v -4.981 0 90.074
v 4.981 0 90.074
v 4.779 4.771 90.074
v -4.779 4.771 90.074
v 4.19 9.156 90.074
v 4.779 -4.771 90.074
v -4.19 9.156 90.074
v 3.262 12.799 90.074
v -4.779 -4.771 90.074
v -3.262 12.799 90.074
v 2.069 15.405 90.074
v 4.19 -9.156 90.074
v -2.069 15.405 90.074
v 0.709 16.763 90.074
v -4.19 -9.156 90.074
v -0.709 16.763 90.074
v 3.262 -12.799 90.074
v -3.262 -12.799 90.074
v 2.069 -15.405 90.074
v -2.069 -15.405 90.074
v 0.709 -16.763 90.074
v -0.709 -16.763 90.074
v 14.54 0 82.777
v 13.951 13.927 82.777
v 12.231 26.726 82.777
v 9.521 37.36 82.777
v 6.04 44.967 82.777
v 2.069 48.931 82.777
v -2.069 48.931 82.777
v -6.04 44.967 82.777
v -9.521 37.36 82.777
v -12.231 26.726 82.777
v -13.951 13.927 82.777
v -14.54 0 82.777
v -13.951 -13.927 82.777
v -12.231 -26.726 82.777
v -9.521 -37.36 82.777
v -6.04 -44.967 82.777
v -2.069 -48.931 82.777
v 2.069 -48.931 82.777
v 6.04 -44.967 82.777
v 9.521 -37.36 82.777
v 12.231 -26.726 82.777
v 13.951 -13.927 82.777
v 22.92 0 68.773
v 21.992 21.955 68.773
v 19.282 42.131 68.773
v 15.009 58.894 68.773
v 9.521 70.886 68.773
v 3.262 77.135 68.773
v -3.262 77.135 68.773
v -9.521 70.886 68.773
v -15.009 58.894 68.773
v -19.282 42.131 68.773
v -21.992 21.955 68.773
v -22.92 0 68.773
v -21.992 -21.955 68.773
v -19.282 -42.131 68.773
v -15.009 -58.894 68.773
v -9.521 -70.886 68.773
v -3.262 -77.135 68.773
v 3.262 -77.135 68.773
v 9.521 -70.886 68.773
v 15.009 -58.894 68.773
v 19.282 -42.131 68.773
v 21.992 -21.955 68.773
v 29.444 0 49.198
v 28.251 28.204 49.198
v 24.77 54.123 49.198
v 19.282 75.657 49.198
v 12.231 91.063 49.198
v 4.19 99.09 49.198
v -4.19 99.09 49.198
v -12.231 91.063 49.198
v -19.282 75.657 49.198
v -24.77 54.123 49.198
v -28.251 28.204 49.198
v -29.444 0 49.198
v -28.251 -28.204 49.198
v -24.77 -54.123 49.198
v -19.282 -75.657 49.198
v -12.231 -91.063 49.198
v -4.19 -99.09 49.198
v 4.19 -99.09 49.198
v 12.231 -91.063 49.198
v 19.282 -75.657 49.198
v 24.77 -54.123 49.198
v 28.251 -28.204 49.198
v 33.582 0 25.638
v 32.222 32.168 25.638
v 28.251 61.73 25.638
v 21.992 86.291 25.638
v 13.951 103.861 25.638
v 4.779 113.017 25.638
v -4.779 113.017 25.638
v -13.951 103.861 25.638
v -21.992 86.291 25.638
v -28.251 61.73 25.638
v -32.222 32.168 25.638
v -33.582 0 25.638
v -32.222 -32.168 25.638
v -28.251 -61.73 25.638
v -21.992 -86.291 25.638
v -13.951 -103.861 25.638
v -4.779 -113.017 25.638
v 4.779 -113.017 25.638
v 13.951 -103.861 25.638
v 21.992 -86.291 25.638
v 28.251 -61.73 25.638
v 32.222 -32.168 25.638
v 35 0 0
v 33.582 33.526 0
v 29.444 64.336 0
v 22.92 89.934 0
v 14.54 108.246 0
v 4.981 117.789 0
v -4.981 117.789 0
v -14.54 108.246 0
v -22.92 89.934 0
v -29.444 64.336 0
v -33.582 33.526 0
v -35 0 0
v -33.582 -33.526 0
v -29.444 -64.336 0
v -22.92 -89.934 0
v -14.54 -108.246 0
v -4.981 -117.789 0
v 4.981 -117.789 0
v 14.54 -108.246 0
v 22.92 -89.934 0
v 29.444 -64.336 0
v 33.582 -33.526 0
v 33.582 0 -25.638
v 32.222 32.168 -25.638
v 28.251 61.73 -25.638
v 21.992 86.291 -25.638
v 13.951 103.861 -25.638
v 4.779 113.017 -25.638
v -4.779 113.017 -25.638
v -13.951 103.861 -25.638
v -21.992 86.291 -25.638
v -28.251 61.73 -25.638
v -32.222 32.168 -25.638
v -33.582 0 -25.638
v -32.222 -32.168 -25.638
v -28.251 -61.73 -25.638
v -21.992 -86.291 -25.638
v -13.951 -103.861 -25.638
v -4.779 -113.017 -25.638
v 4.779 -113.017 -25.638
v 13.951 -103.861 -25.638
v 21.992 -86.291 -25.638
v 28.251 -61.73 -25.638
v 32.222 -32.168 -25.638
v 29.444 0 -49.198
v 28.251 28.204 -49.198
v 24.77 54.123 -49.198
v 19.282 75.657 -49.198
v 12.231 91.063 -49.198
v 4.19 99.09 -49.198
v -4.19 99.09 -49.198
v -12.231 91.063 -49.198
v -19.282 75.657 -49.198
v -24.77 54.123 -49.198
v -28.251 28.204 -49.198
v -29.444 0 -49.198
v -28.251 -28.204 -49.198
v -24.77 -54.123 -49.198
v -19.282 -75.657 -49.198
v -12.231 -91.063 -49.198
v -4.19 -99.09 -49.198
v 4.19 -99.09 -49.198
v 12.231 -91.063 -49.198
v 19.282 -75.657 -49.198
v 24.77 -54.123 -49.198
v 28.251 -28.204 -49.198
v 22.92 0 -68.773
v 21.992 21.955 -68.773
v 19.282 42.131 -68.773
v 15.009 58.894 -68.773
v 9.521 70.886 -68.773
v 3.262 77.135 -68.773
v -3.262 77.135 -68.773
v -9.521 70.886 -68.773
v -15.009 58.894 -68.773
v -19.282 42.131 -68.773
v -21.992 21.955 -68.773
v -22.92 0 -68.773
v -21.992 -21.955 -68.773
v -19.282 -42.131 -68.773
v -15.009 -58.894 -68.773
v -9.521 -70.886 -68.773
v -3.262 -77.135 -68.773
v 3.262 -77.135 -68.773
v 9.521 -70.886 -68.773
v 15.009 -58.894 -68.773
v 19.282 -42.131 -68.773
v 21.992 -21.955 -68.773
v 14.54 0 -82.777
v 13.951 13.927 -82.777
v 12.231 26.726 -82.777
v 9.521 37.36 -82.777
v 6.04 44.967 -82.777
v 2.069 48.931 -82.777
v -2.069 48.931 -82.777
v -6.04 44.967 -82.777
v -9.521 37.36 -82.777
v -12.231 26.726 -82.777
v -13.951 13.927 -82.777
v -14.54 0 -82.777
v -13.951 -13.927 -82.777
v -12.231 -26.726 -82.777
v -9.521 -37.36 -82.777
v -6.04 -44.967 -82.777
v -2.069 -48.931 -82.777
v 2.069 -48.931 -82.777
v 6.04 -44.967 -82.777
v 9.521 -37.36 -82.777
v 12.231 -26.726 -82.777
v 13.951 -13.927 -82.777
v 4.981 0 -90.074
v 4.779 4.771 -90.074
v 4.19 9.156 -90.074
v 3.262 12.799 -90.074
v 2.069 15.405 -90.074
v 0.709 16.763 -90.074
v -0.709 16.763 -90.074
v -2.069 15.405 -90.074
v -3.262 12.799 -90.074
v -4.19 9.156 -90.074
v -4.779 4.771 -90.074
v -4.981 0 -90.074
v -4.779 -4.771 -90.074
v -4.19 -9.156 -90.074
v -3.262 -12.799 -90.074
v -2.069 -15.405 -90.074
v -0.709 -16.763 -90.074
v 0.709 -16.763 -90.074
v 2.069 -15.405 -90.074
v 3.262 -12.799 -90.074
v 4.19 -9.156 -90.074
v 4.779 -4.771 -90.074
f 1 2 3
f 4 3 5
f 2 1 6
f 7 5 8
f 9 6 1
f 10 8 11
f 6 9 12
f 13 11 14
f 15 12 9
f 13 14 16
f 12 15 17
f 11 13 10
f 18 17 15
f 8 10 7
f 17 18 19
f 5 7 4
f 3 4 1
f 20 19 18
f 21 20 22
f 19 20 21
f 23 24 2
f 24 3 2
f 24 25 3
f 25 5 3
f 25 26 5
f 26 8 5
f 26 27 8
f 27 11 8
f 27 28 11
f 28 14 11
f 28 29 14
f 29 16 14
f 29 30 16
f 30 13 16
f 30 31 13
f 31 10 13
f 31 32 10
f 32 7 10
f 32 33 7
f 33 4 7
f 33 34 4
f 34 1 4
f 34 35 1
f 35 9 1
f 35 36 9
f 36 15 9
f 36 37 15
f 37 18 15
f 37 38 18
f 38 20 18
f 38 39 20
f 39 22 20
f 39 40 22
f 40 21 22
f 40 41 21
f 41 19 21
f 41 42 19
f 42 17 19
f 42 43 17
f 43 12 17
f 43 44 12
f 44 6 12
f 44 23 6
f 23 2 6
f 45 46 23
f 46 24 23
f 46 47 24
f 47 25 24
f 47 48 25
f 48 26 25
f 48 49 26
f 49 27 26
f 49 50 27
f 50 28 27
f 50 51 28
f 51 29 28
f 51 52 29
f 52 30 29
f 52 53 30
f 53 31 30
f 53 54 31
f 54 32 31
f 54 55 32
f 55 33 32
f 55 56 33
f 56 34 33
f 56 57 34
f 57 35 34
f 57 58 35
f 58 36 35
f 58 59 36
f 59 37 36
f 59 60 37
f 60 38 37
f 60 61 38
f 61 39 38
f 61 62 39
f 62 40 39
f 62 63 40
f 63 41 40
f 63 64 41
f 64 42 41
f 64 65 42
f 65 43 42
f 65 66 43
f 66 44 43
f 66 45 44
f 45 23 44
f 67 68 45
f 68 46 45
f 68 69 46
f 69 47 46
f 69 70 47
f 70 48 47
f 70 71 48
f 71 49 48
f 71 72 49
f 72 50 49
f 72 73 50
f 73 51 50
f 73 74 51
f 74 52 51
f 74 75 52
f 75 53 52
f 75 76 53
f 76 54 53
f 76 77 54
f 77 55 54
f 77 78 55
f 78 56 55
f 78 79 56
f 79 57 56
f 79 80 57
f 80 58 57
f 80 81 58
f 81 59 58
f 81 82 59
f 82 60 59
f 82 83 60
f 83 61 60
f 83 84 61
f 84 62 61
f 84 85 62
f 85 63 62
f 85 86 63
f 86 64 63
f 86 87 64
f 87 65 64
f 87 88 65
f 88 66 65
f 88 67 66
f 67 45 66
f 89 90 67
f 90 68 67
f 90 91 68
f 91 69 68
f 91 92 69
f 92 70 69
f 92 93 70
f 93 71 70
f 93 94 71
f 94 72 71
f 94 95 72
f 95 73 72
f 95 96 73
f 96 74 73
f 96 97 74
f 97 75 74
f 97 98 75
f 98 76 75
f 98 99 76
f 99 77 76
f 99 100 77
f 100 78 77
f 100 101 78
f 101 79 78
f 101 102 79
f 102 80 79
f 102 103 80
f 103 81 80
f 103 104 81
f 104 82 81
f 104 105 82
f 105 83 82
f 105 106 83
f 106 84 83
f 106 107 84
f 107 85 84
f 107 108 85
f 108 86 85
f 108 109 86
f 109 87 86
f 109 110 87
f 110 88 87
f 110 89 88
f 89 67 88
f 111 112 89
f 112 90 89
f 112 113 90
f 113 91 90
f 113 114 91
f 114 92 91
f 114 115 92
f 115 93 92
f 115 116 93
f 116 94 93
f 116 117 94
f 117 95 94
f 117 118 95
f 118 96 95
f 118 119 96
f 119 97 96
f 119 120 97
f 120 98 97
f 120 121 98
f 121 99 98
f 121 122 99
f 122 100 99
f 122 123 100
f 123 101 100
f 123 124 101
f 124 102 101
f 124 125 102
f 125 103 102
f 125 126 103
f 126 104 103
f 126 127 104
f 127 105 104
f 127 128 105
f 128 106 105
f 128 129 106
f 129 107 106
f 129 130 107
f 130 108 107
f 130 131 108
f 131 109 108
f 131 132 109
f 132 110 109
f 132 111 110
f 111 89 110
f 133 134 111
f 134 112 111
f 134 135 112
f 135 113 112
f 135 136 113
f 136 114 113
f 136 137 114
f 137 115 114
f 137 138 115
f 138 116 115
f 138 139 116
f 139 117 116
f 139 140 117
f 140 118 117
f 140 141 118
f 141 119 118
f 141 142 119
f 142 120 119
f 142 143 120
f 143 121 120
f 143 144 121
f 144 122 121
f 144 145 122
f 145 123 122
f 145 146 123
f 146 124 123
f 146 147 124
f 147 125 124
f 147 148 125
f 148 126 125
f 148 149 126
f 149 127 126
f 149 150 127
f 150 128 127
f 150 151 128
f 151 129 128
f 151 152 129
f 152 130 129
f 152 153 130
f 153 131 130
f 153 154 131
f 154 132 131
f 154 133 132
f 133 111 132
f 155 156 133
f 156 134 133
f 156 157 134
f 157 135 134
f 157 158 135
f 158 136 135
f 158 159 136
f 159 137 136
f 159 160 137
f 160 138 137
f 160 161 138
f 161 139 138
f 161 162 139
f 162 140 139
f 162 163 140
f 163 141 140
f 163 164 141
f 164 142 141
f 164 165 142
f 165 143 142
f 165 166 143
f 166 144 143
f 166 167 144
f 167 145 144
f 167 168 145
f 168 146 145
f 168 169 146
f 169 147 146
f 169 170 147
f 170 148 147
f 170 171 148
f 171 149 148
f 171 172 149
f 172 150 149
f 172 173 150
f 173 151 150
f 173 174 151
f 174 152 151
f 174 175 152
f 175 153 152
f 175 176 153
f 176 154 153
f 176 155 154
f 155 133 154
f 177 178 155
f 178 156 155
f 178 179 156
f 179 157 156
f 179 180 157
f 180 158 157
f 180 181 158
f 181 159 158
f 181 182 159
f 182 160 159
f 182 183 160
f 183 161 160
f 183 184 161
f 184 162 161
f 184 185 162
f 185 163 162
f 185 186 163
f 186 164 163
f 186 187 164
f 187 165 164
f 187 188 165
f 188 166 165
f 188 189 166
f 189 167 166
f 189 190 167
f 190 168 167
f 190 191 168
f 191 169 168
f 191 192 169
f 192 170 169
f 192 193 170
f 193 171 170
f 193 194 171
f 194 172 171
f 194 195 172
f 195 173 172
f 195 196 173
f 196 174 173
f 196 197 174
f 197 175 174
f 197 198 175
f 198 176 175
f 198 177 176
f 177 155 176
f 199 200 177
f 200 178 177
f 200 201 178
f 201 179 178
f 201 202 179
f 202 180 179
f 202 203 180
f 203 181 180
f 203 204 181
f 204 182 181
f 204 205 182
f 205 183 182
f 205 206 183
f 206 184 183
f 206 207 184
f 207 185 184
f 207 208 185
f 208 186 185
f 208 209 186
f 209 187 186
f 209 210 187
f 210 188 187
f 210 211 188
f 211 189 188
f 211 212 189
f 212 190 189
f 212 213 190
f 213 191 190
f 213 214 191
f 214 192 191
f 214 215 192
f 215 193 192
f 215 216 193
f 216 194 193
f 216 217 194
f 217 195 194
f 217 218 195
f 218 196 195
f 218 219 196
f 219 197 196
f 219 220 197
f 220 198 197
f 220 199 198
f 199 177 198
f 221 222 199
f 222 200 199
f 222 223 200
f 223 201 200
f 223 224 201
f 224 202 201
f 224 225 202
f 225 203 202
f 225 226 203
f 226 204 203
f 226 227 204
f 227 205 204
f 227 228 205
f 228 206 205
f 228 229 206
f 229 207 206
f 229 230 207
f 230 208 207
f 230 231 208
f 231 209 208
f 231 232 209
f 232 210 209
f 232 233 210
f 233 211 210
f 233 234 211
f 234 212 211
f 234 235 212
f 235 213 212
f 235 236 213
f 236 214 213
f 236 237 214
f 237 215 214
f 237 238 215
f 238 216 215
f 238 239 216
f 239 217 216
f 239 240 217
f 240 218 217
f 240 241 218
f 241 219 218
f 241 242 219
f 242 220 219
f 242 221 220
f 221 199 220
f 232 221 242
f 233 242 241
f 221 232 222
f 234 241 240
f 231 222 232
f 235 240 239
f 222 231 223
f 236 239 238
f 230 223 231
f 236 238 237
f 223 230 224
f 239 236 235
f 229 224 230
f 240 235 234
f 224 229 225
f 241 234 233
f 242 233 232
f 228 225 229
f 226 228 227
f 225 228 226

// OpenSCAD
// Generated by SolidPython 1.0.1 on 2020-07-29 00:46:47


scale(v = [5, 17, 13]) {
	sphere(r = 7);
}
/***********************************************
*********      SolidPython code:      **********
************************************************
 
# import packages: SolidPython
from solid import *
from solid.utils import *
from itertools import chain, combinations, permutations


class Resize:

    def __init__(self, scad_file):
        self.scad_file = scad_file
        #self.scad_file = import_scad(scad_file)
        # cone/cylinder param:
        self.r1 = 0
        self.r2 = 0
        self.h = 0
        # rectangular prism param:
        self.w = 0
        self.l = 0
        # ellipse param:
        self.r = 0

    # import OpenScad code (file name corresponds to shape)


    # classify shape + parameters
    def assign(self, param1, param2, param3):
        if self.scad_file == 'cone.scad':
            self.r1 = param1
            self.r2 = param2
            self.h = param3
        elif self.scad_file == 'cylinder.scad':
            self.r1 = param1
            self.r2 = param2
            self.h = param3
        elif self.scad_file == 'rectangularPrism.scad':
            self.h = param1
            self.l = param2
            self.w = param3
        else:
            self.r = param1
            self.h = param2

    # resize parameters
    def iterate(self):
        x = range(3, 20, 2)
        i = 1
        if self.scad_file == 'cone.scad':
            tempList = list(permutations(x, 2))
            for temp in tempList:
                param1 = temp[0]
                param2 = temp[1]
                filepath = 'produced_scad_files/' + 'cone' + str(param1) + '_' + str(param2) + '_' + '.scad'
                scad_render_to_file(cylinder(h=param1, r1=param2, r2=0), filepath)

        elif self.scad_file == 'cylinder.scad':
            tempList = list(permutations(x, 3))
            for temp in tempList:
                param1 = temp[0]
                param2 = temp[1]
                filepath = 'produced_scad_files/' + 'cylinder' + str(param1) + '_' + str(param2) + '_' + '.scad'
                scad_render_to_file(cylinder(h=param1, r1=param2, r2=param2), filepath)

        elif self.scad_file == 'rectangularPrism.scad':
            tempList = list(permutations(x, 3))
            for temp in tempList:
                param1 = temp[0]
                param2 = temp[1]
                param3 = temp[2]
                filepath = 'produced_scad_files/' + 'rectangularPrism' + str(param1) + '_' + str(param2) + '_' + str(
                    param3) + '.scad'
                scad_render_to_file(cube(size=(param1, param2, param3)), filepath)

        elif self.scad_file == 'ellipse.scad':
            tempList = list(permutations(x, 4))
            for temp in tempList:
                param1 = temp[0]
                param2 = temp[1]
                param3 = temp[2]
                param4 = temp[3]
                filepath = 'produced_scad_files/' + 'ellipse' + str(param1) + '_' + str(param2) + '_' + str(param3) + '_' + str(param4) + '.scad'
                scad_render_to_file(scale([param1, param2, param3])(sphere(r=param4)), filepath)

    def render_to_scadfile(self):
        scad_render_to_file(scad, 'example.scad') 
 
************************************************/
